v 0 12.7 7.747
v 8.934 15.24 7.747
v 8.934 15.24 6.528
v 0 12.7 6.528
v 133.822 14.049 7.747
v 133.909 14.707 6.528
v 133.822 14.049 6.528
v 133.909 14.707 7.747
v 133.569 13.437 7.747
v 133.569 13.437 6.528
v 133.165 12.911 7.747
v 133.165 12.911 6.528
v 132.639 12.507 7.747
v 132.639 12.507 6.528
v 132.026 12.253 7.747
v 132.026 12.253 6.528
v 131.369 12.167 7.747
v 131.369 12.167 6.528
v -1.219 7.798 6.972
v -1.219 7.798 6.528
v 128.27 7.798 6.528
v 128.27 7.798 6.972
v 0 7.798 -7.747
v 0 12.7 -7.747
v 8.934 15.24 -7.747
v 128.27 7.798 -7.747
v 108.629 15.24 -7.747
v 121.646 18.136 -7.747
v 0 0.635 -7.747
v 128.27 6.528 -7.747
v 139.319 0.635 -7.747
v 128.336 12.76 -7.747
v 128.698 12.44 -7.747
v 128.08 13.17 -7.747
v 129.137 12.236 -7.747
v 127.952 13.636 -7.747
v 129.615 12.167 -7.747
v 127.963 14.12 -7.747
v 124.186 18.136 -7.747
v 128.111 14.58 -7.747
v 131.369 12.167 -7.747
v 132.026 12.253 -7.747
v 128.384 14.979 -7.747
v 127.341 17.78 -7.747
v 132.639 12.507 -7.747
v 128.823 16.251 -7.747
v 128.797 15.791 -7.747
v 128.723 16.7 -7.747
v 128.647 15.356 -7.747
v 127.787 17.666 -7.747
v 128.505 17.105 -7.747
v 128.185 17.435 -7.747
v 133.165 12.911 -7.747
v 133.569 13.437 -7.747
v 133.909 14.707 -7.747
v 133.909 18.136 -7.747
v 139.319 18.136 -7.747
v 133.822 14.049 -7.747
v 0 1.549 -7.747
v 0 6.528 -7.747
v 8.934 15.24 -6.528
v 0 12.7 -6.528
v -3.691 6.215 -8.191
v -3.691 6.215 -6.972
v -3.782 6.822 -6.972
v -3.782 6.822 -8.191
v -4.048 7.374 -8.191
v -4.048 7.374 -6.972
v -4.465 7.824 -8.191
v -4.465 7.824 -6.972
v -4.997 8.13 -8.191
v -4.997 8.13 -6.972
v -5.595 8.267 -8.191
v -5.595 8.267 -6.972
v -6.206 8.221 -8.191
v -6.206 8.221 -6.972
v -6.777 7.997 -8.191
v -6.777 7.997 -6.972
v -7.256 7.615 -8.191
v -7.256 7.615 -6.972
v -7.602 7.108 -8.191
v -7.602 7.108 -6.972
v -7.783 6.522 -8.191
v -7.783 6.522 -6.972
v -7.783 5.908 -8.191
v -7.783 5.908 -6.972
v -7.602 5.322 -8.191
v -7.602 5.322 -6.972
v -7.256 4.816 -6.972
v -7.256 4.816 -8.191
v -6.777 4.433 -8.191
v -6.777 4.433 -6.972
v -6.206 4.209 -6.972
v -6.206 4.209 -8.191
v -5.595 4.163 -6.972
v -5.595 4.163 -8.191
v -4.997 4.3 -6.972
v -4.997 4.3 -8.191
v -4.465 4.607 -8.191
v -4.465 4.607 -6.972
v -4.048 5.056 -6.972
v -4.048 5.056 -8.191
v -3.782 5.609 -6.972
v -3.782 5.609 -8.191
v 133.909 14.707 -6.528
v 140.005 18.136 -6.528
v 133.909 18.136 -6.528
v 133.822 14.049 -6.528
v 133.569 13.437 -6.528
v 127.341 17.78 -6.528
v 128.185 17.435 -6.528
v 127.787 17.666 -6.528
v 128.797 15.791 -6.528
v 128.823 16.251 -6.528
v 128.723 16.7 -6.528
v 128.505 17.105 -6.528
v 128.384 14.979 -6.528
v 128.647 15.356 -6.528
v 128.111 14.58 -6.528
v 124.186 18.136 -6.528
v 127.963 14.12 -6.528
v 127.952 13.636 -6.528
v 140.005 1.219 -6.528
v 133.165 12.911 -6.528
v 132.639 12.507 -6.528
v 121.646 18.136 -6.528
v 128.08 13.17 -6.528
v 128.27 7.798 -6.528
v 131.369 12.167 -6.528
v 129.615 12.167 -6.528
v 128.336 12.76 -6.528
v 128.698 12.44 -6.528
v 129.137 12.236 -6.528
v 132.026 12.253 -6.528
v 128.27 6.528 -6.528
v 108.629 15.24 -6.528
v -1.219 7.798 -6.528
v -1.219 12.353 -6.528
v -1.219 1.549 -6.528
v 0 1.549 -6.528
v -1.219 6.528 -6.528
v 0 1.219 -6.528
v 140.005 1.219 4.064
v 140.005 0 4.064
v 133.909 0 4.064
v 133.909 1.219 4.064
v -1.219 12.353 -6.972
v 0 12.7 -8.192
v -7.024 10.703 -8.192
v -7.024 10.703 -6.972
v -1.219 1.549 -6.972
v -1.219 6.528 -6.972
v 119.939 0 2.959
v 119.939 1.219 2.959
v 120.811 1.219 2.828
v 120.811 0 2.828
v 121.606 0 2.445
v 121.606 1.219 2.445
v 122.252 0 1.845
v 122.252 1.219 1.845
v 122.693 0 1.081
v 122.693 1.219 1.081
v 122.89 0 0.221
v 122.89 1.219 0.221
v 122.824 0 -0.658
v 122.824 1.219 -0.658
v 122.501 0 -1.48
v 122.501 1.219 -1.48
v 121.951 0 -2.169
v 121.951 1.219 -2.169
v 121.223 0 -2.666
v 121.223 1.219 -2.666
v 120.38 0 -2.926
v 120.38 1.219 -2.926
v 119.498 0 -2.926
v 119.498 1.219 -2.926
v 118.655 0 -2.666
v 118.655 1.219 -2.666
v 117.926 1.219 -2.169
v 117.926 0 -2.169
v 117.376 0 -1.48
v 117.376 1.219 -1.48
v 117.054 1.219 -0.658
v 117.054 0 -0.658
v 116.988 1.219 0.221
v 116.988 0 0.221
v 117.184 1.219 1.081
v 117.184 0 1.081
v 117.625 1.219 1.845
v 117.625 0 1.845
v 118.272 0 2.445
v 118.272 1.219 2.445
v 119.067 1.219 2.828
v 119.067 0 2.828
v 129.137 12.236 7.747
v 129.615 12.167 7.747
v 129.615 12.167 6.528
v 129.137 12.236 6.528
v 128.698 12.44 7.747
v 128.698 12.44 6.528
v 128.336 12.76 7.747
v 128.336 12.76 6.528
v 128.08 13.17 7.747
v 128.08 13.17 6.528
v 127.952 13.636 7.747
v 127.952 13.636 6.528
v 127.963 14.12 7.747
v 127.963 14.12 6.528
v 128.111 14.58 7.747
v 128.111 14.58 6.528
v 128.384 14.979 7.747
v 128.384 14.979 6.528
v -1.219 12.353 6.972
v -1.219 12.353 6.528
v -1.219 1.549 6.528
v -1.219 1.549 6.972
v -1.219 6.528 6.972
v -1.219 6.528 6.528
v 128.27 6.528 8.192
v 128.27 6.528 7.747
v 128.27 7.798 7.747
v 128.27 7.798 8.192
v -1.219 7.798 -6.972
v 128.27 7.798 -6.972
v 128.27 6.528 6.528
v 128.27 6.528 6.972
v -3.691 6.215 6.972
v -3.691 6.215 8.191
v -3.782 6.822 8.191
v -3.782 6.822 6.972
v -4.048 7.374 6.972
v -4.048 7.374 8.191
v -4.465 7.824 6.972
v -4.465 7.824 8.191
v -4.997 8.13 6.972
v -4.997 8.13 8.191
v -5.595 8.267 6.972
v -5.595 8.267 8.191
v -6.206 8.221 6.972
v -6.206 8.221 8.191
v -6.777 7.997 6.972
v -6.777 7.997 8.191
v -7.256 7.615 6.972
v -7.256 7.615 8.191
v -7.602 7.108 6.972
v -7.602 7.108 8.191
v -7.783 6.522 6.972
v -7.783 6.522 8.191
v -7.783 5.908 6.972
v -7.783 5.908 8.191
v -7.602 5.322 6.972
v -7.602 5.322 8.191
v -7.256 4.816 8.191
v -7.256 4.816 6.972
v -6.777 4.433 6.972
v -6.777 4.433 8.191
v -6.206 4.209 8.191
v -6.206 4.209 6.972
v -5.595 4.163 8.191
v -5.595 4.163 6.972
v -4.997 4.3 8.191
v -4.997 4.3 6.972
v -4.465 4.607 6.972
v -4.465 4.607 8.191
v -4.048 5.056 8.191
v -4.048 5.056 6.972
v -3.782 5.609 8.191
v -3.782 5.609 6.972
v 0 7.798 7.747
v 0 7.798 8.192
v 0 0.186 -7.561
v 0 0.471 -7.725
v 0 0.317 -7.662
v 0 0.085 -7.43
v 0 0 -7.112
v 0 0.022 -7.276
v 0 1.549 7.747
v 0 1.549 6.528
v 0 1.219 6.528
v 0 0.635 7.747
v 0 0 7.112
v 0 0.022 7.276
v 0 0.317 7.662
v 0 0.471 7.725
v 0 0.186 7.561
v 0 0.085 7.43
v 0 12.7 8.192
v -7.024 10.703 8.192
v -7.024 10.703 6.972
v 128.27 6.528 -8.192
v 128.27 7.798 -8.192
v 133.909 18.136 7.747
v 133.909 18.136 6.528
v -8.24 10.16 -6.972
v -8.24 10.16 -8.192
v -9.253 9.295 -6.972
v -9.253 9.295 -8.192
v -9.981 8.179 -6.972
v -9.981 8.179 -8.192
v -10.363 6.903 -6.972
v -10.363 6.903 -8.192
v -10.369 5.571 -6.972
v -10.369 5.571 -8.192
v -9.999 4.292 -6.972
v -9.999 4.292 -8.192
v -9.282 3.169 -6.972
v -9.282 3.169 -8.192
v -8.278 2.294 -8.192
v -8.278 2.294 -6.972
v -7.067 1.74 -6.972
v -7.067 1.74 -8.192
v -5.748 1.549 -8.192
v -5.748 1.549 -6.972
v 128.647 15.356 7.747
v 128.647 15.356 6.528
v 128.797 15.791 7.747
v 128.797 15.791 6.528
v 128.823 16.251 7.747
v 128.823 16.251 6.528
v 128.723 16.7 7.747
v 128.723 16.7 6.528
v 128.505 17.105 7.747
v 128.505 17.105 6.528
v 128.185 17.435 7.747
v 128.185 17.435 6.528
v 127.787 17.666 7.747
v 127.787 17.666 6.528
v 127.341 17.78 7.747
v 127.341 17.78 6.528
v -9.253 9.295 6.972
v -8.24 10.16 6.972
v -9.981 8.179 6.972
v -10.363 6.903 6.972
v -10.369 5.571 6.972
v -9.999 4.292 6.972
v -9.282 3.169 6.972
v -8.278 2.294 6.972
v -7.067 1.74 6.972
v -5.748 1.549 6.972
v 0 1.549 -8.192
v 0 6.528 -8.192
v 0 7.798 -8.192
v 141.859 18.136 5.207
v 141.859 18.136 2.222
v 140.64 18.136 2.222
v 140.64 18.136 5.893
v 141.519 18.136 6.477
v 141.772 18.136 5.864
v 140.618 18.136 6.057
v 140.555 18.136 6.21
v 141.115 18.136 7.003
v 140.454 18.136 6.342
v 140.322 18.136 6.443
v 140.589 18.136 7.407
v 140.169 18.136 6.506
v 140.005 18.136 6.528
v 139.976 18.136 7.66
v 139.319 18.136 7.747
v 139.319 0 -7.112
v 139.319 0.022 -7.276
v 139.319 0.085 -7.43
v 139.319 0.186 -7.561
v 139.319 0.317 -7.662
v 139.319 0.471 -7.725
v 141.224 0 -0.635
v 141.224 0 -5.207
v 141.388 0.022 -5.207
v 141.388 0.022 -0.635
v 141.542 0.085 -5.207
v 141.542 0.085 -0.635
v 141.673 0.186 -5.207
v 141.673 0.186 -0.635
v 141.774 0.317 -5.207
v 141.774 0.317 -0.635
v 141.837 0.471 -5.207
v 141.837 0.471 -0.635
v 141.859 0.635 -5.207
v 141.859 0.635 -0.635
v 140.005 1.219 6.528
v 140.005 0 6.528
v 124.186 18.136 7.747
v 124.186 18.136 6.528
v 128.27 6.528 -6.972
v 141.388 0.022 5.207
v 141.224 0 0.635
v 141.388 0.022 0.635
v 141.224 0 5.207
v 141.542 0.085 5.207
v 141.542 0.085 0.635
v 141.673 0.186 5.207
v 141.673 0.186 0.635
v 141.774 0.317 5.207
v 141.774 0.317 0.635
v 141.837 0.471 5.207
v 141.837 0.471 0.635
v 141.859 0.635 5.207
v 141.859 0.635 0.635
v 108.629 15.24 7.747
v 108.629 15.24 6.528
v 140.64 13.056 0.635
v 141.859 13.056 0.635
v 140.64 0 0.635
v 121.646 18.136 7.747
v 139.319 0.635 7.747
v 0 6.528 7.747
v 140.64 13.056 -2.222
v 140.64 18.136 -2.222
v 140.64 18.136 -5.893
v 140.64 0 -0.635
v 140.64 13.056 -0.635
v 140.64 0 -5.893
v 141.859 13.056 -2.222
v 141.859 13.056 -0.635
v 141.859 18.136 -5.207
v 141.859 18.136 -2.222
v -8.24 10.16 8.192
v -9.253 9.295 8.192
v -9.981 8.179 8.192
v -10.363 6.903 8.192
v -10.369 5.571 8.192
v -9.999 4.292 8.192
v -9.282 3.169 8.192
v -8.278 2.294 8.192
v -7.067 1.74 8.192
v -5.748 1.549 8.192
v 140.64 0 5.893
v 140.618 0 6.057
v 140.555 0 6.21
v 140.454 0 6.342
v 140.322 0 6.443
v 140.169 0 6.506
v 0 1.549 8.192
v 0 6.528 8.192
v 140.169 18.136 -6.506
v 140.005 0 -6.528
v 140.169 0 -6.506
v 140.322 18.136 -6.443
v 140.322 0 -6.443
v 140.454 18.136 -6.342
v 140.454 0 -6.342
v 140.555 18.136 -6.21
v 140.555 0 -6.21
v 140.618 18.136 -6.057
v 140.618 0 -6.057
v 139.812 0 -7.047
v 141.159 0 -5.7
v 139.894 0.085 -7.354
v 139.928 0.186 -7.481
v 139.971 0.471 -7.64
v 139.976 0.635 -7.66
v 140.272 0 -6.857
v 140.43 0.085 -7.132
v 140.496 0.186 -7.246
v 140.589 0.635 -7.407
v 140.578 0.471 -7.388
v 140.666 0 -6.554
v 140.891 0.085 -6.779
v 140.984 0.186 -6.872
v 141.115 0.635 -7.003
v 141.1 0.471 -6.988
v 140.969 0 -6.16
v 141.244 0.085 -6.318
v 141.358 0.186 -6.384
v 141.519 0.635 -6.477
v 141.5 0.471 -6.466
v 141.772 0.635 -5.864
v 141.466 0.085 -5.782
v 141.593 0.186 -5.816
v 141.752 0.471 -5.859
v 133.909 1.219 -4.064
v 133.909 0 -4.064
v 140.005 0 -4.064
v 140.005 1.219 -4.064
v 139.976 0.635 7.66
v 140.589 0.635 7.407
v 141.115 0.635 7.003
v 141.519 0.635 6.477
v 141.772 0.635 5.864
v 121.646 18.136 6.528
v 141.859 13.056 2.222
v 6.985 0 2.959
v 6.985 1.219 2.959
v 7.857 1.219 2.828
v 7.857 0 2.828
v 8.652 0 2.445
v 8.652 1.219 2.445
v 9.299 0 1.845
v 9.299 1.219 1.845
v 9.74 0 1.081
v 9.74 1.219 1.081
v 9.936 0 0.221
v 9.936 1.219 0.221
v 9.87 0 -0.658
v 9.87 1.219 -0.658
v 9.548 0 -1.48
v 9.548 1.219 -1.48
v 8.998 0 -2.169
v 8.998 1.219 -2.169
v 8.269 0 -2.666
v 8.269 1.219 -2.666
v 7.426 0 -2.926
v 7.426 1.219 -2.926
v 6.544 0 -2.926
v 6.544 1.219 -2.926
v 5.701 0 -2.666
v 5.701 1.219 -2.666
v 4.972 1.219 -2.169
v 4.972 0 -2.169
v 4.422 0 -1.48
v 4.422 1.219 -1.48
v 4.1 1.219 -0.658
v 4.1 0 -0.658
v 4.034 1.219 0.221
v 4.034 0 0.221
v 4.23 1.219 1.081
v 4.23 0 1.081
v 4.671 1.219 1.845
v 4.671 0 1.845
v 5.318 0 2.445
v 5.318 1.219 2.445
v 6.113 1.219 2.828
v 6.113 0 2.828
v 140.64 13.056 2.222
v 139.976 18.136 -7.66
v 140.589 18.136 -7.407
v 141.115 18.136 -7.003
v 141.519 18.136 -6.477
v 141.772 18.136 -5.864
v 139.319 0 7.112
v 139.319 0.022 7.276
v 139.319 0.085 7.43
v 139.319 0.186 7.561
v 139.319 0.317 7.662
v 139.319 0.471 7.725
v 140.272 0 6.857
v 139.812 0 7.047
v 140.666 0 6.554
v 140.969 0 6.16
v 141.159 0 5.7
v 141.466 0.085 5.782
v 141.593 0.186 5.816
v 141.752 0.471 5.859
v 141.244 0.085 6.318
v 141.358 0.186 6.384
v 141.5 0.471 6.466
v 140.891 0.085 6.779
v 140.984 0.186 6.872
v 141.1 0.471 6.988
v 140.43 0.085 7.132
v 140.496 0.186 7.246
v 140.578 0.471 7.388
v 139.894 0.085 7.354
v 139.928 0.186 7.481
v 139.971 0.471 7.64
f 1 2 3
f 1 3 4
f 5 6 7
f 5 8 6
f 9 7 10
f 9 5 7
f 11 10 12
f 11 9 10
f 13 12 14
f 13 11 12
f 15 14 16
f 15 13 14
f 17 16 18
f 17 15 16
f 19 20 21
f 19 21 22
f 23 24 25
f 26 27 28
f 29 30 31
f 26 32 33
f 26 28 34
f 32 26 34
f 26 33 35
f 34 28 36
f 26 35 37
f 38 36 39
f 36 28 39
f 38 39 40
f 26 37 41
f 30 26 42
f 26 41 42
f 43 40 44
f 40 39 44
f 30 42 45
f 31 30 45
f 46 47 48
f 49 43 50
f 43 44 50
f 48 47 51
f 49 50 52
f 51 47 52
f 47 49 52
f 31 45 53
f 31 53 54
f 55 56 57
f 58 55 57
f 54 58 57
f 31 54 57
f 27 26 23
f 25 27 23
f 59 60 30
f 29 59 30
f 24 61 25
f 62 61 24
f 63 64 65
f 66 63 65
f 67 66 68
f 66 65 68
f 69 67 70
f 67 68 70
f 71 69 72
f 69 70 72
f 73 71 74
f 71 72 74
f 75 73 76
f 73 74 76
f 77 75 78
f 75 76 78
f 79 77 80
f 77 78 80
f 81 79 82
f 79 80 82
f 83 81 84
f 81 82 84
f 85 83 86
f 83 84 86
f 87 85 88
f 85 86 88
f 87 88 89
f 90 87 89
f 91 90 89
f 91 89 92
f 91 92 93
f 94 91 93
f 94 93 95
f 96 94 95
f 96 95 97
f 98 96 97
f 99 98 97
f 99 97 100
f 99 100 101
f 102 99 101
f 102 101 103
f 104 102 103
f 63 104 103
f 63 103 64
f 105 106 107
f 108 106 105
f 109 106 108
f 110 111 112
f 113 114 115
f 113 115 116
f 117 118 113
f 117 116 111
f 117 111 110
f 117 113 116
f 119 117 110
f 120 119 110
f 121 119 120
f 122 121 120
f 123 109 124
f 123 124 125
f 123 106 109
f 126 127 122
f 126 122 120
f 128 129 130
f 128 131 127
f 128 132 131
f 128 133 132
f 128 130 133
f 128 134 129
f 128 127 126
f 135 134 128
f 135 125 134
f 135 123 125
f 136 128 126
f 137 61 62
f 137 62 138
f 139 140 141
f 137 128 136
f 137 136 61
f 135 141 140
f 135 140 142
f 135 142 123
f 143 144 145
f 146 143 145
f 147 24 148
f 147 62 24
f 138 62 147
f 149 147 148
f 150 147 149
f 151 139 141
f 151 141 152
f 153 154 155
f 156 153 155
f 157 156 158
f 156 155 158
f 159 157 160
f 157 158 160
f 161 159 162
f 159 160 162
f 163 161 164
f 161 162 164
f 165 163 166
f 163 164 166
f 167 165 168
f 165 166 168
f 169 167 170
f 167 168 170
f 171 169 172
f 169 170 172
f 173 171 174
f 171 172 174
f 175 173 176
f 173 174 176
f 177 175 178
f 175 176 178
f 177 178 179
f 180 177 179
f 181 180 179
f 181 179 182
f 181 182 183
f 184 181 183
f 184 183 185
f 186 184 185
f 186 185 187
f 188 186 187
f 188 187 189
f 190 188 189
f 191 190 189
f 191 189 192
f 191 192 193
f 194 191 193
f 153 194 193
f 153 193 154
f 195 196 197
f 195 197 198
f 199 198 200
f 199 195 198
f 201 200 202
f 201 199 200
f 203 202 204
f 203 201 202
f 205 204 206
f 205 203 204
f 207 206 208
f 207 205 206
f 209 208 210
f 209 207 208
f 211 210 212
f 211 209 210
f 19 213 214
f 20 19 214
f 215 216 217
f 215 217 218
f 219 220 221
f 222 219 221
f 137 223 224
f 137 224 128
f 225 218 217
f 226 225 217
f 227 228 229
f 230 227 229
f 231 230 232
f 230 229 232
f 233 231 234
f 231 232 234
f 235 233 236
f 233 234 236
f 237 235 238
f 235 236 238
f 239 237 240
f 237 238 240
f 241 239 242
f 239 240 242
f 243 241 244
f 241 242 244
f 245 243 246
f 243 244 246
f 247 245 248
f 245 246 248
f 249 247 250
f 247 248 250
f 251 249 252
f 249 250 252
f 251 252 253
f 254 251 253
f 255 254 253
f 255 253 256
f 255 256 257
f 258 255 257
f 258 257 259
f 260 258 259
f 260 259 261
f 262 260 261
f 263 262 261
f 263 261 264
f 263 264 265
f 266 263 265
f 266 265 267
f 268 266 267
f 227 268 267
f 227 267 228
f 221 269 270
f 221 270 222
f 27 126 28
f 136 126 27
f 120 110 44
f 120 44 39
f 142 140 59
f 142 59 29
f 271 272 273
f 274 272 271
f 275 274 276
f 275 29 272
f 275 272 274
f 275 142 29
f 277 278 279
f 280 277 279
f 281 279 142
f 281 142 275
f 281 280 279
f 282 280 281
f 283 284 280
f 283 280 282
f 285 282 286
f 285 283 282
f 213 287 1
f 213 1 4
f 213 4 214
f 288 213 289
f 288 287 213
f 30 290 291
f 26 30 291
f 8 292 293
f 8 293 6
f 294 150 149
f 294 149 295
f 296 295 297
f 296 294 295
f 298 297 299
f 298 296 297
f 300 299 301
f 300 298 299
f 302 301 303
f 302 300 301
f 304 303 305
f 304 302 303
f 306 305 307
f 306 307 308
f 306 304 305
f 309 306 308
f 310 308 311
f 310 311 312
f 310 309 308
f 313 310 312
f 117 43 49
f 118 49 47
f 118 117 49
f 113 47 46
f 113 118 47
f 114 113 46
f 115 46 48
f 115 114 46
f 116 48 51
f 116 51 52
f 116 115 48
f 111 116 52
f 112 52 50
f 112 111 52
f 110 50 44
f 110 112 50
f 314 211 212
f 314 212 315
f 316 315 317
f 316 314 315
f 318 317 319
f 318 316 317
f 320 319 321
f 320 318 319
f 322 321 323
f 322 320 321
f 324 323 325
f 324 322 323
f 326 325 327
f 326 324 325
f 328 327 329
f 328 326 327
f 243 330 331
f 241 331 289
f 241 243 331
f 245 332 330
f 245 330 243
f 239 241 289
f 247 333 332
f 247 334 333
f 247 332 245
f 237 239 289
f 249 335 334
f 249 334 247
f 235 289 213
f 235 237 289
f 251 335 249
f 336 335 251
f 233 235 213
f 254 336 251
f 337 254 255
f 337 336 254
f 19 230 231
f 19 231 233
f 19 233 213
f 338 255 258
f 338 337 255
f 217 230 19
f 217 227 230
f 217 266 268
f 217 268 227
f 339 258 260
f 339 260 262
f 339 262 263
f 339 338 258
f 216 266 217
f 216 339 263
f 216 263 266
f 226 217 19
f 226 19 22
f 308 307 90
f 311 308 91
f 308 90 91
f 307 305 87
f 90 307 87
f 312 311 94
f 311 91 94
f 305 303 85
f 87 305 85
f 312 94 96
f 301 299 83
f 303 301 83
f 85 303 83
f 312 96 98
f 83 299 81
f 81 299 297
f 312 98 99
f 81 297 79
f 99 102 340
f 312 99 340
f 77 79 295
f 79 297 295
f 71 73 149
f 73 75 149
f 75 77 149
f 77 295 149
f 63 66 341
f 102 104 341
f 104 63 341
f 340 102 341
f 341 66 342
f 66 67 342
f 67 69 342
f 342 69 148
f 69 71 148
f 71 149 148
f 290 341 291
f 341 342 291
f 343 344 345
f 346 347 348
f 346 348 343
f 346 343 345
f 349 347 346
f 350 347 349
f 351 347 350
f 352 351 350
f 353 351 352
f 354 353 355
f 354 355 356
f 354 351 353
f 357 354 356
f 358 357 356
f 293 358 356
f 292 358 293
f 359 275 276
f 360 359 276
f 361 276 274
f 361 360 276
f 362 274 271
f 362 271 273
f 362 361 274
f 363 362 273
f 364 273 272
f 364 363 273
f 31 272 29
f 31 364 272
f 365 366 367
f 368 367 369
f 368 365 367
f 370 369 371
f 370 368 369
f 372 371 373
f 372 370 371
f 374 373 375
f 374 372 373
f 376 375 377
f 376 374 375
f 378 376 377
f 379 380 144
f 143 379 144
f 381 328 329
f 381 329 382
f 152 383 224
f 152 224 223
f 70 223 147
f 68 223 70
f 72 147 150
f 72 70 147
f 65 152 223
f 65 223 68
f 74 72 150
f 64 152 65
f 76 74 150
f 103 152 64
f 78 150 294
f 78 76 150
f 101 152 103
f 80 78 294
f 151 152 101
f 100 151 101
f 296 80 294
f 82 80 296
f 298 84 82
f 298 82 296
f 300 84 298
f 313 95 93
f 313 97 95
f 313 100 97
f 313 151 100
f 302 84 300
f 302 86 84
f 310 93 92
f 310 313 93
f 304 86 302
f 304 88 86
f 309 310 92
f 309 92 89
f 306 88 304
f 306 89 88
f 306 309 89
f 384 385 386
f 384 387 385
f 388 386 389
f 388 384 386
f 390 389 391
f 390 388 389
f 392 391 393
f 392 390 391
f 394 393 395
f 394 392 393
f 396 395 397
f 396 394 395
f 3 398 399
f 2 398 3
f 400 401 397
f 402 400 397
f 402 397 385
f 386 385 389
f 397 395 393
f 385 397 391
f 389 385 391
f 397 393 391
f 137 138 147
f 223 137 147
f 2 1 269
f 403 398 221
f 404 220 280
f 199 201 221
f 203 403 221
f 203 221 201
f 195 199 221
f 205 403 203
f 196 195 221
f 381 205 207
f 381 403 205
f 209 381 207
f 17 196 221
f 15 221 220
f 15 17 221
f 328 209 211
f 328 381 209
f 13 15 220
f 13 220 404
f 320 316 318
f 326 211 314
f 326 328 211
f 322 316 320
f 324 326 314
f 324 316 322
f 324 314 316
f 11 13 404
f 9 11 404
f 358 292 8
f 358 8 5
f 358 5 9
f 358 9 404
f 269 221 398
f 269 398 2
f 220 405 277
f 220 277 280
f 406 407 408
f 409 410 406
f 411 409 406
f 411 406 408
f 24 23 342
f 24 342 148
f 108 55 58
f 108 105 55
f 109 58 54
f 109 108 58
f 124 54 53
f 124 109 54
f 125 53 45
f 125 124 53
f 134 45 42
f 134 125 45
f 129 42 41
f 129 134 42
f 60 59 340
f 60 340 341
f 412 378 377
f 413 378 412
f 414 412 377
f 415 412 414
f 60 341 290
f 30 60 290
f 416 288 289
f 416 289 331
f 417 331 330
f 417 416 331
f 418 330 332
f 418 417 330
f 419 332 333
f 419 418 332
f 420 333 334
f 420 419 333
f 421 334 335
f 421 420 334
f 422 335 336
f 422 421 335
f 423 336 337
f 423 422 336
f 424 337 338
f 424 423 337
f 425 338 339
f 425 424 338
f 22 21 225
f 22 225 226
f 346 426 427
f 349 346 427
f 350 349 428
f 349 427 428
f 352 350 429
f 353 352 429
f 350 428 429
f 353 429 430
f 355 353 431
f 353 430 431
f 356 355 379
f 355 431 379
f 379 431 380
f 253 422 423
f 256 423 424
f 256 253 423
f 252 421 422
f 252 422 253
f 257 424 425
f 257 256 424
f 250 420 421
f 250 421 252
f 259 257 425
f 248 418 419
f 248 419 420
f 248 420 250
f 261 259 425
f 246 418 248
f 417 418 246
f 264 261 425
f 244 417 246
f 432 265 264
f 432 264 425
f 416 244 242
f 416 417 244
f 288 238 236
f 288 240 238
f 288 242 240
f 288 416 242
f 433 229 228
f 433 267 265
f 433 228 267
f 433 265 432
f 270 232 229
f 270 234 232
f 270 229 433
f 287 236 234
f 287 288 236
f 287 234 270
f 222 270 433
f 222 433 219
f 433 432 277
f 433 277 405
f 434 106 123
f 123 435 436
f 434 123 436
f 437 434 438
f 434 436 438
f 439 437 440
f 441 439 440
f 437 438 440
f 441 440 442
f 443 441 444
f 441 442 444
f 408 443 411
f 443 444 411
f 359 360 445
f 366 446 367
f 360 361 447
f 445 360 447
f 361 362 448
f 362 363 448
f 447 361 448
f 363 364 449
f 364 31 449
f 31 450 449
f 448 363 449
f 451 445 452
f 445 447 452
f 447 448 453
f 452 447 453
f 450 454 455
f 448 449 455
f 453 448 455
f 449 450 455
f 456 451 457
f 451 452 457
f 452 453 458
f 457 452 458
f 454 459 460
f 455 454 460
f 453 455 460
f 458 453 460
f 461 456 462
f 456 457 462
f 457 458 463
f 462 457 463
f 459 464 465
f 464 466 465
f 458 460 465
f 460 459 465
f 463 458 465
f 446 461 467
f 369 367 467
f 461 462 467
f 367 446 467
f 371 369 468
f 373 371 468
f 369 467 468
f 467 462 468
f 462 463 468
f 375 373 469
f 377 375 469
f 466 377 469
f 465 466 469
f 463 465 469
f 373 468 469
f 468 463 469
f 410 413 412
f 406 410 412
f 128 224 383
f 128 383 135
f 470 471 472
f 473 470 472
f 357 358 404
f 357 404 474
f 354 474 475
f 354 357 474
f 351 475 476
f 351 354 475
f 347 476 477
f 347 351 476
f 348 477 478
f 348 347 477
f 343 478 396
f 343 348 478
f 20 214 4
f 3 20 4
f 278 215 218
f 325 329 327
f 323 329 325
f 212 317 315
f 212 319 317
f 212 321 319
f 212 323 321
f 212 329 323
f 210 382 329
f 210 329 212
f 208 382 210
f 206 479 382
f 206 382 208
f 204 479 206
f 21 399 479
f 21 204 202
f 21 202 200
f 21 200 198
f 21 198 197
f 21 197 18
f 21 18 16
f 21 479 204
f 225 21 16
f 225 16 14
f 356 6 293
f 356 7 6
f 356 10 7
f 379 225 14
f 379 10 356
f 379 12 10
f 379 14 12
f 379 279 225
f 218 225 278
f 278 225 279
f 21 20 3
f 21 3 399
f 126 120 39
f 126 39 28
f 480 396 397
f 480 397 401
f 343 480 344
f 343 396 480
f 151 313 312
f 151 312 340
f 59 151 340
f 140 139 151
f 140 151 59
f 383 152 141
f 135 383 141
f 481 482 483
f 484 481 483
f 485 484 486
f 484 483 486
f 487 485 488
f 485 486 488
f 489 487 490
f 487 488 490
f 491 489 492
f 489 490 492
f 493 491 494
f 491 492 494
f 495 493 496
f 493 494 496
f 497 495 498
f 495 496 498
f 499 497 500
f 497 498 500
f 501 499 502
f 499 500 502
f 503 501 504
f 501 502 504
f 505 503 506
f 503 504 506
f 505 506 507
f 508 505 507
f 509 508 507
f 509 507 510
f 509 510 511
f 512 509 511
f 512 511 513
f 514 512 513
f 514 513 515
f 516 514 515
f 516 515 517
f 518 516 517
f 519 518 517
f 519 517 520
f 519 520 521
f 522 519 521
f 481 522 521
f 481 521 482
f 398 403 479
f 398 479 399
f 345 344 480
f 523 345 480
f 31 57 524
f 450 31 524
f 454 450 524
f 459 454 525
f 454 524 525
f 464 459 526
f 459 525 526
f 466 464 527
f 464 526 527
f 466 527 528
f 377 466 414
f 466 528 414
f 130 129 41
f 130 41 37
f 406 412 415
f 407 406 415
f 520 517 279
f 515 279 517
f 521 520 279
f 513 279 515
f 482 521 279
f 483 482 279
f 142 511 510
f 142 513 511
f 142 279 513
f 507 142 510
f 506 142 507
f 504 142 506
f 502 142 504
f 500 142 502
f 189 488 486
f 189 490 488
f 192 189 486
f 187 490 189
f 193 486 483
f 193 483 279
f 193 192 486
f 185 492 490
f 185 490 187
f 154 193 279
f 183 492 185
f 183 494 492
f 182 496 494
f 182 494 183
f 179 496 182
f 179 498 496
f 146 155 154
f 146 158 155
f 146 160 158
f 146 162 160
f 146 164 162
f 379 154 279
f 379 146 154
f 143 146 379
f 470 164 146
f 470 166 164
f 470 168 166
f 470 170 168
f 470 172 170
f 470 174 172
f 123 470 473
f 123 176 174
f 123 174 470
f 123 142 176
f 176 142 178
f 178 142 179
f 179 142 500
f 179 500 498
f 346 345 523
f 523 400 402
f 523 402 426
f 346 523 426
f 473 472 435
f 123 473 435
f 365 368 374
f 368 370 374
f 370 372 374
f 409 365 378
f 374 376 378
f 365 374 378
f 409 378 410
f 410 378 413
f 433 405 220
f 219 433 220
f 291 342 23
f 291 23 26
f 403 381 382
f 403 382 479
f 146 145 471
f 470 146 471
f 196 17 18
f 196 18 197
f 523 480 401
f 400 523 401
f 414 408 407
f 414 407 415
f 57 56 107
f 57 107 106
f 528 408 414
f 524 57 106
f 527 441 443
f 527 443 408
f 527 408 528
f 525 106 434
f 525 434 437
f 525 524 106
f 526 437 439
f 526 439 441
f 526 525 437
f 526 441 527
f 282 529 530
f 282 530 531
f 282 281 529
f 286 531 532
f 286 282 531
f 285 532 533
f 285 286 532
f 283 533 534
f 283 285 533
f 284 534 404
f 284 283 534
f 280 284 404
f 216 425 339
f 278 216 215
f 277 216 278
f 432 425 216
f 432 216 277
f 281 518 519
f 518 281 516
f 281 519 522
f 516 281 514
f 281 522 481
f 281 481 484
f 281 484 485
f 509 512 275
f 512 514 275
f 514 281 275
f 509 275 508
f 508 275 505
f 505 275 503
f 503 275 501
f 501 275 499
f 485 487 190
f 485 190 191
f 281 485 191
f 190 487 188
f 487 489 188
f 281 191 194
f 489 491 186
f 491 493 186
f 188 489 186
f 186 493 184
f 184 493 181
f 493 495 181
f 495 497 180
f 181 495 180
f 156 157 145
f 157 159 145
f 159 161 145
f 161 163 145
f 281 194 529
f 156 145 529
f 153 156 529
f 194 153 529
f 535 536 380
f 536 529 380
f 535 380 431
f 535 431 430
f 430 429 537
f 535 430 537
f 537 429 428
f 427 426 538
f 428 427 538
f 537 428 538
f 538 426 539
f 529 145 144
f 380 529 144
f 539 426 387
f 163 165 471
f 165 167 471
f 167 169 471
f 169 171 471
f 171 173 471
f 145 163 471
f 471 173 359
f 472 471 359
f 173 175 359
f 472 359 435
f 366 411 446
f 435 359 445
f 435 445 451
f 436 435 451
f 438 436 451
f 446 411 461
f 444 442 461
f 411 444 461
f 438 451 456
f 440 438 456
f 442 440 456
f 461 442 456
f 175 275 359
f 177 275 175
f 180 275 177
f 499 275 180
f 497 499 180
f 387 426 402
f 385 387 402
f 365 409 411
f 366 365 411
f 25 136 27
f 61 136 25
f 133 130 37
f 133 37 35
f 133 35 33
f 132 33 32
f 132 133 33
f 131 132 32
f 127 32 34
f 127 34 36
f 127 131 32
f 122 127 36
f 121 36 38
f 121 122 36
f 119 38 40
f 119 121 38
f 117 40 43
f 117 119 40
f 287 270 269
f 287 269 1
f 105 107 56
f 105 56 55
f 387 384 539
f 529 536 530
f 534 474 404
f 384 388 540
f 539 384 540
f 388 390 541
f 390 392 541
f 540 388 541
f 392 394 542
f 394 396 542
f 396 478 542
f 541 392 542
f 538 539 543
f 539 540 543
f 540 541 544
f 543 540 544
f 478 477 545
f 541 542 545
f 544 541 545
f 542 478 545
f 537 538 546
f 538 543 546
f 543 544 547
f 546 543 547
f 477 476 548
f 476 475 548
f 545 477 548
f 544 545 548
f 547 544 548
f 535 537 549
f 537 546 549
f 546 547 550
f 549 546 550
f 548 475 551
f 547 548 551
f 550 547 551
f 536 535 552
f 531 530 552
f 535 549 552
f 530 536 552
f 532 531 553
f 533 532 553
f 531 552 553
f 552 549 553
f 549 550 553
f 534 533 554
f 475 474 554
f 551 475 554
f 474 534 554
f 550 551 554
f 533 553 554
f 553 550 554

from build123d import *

# Parameters (mm, degrees)
BOSS_EXTRUDE1_DEPTH          = 7.747
BOSS_EXTRUDE2_DEPTH          = 8.1915
SHELL1_START                 = 1.2192
SHELL1_DEPTH                 = 16.9164
CUT_EXTRUDE1_DEPTH           = 1.2192
EXTRUDE_THIN1_START          = -16.383
SKETCH4_W                    = 128.27
SKETCH4_H                    = 1.27
EXTRUDE_THIN1_DEPTH          = 16.383
FILLET1_R                    = 2.54
SKETCH5_W                    = 13.9446
SKETCH5_H                    = 1.27
CUT_EXTRUDE2_DEPTH           = 129.4892
F_3_4_0_162_DIAMETER_HOLE1_D = 4.1148
CUT_EXTRUDE3_REACH           = 145.248
FILLET2_DEPTH                = 18.1356
CUT_EXTRUDE4_REACH           = 145.099
SKETCH9_R                    = 2.9591
FILLET3_R                    = 0.635
FILLET4_R                    = 2.54


with BuildPart() as part:
    # Sketch1 → Boss-Extrude1 (new, symmetric)
    with BuildSketch(Plane.XY):
        with BuildLine():
            Line((0, 0), (141.859, 0))
            Line((141.859, 0), (141.859, 18.1356))
            Line((141.859, 18.1356), (133.9088, 18.1356))
            Line((133.9088, 18.1356), (133.9088, 12.1666))
            Line((133.9088, 12.1666), (129.615181762, 12.1666))
            ThreePointArc((129.615181762, 12.1666), (128.080397702, 13.170161892), (128.3843, 14.978570578))
            ThreePointArc((128.3843, 14.978570578), (128.72346749, 16.699838275), (127.341060995, 17.78))
            Line((127.341060995, 17.78), (124.186037439, 18.1356))
            Line((124.186037439, 18.1356), (121.646037439, 18.1356))
            Line((121.646037439, 18.1356), (108.629212725, 15.24))
            Line((108.629212725, 15.24), (8.934212725, 15.24))
            Line((8.934212725, 15.24), (0, 12.7))
            Line((0, 12.7), (0, 0))
        make_face()
    extrude(amount=BOSS_EXTRUDE1_DEPTH, both=True)

    # Sketch2 → Boss-Extrude2 (add, symmetric)
    with BuildSketch(Plane.XY):
        with BuildLine():
            Line((0, 12.7), (-7.024172619, 10.703025112))
            ThreePointArc((-7.024172619, 10.703025112), (-10.369324418, 5.571014033), (-5.748264059, 1.5494))
            Line((-5.748264059, 1.5494), (0, 1.5494))
            Line((0, 1.5494), (0, 12.7))
        make_face()
    extrude(amount=BOSS_EXTRUDE2_DEPTH, both=True)

    # Shell1: read off the stored shape, not the designer's step
    # Shell1 outline → Shell1 (cut)
    with BuildSketch(Plane(origin=(0, 0, 0), x_dir=(1, 0, 0), z_dir=(0, 1, 0)).offset(SHELL1_START)):
        Polygon((140.6398, -6.5278), (140.6398, 6.5278), (-1.2192, 6.5278), (-1.2192, 6.9723), (-12, 6.9723), (-12, -6.9723), (-1.2192, -6.9723), (-1.2192, -6.5278), align=None)
    extrude(amount=SHELL1_DEPTH, mode=Mode.SUBTRACT)

    # Sketch3 → Cut-Extrude1 (cut)
    with BuildSketch(Plane(origin=(141.859, 0, 0), x_dir=(0, 0, -1), z_dir=(1, 0, 0))):
        Polygon((-2.2225, 13.0556), (-0.635, 13.0556), (-0.635, 0), (0.635, 0), (0.635, 13.0556), (2.2225, 13.0556), (2.2225, 18.1356), (-2.2225, 18.1356), align=None)
    extrude(amount=-CUT_EXTRUDE1_DEPTH, mode=Mode.SUBTRACT)

    # Sketch4 → Extrude-Thin1 (add)
    with BuildSketch(Plane.XY.offset(8.1915).offset(EXTRUDE_THIN1_START)):
        with Locations((64.135, 7.1628)):
            Rectangle(SKETCH4_W, SKETCH4_H)
    extrude_thin1 = extrude(amount=EXTRUDE_THIN1_DEPTH)

    # Fillet1
    fillet1_edges = [part.edges().sort_by_distance(p)[0] for p in [
        (141.859, 9.0678, 7.747),
        (141.859, 9.0678, -7.747),
    ]]
    fillet(fillet1_edges, radius=FILLET1_R)

    # Mirror2: Extrude-Thin1 across plane
    add(extrude_thin1.mirror(Plane.XY))

    # Sketch5 → Cut-Extrude2 (cut)
    with BuildSketch(Plane.ZY.offset(1.2192)):
        with Locations((0, 7.1628)):
            Rectangle(SKETCH5_W, SKETCH5_H)
    extrude(amount=-CUT_EXTRUDE2_DEPTH, mode=Mode.SUBTRACT)

    # 3/4 (0.162) Diameter Hole1 (through all)
    with Locations(Plane(origin=(0, 0, -8.1915), x_dir=(-1, 0, 0), z_dir=(0, 0, -1))):
        with Locations((5.748264059, 6.215135941)):
            Hole(F_3_4_0_162_DIAMETER_HOLE1_D / 2)

    # Sketch8 → Cut-Extrude3 (cut, up to next)
    with BuildSketch(Plane.XZ, mode=Mode.PRIVATE) as cut_extrude3_sk1:
        Polygon((140.6398, -6.5278), (140.6398, 6.5278), (140.0048, 6.5278), (140.0048, 4.064), (133.9088, 4.064), (133.9088, -4.064), (140.0048, -4.064), (140.0048, -6.5278), align=None)
    cut_extrude3_tool1 = extrude(cut_extrude3_sk1.sketch, amount=-CUT_EXTRUDE3_REACH, mode=Mode.PRIVATE) & part.part
    add(cut_extrude3_tool1.solids().sort_by_distance((137.439195, 0, 0))[0], mode=Mode.SUBTRACT)

    # Fillet2: read off the stored shape, not the designer's step
    # Fillet2 outline → Fillet2 (add)
    with BuildSketch(Plane(origin=(0, 0, 0), x_dir=(1, 0, 0), z_dir=(0, 1, 0))):
        with BuildLine():
            ThreePointArc((140.0048, 6.5278), (140.453812806, 6.341812806), (140.6398, 5.8928))
            Line((140.6398, 5.8928), (140.6398, 6.5278))
            Line((140.6398, 6.5278), (140.0048, 6.5278))
        make_face()
        with BuildLine():
            Line((140.6398, -6.5278), (140.6398, -5.8928))
            ThreePointArc((140.6398, -5.8928), (140.453812806, -6.341812806), (140.0048, -6.5278))
            Line((140.0048, -6.5278), (140.6398, -6.5278))
        make_face()
    extrude(amount=FILLET2_DEPTH)

    # Sketch9 → Cut-Extrude4 (cut, up to next)
    with BuildSketch(Plane(origin=(0, 1.2192, 0), x_dir=(1, 0, 0), z_dir=(0, 1, 0)), mode=Mode.PRIVATE) as cut_extrude4_sk1:
        with Locations(Location((119.9388, 0, 0), (0, 0, 270))):
            Circle(SKETCH9_R)
    cut_extrude4_tool1 = extrude(cut_extrude4_sk1.sketch, amount=-CUT_EXTRUDE4_REACH, mode=Mode.PRIVATE) & part.part
    # Sketch9 → Cut-Extrude4 (cut, up to next)
    with BuildSketch(Plane(origin=(0, 1.2192, 0), x_dir=(1, 0, 0), z_dir=(0, 1, 0)), mode=Mode.PRIVATE) as cut_extrude4_sk2:
        with Locations(Location((6.985, 0, 0), (0, 0, 270))):
            Circle(SKETCH9_R)
    cut_extrude4_tool2 = extrude(cut_extrude4_sk2.sketch, amount=-CUT_EXTRUDE4_REACH, mode=Mode.PRIVATE) & part.part
    add(cut_extrude4_tool1.solids().sort_by_distance((119.9388, 1.2192, 0))[0], mode=Mode.SUBTRACT)
    add(cut_extrude4_tool2.solids().sort_by_distance((6.985, 1.2192, 0))[0], mode=Mode.SUBTRACT)

    # Fillet3
    fillet3_edges = [part.edges().sort_by_distance(p)[0] for p in [
        (141.859, 0, -2.921),
        (69.6595, 0, -7.747),
        (141.859, 0, 2.921),
        (141.115051224, 0, 7.003051224),
        (141.115051224, 0, -7.003051224),
        (69.6595, 0, 7.747),
    ]]
    fillet(fillet3_edges, radius=FILLET3_R)

    # Fillet4
    fillet4_edges = [part.edges().sort_by_distance(p)[0] for p in [
        (133.9088, 12.1666, 7.1374),
        (133.9088, 12.1666, -7.1374),
    ]]
    fillet(fillet4_edges, radius=FILLET4_R)


solid = part.part
